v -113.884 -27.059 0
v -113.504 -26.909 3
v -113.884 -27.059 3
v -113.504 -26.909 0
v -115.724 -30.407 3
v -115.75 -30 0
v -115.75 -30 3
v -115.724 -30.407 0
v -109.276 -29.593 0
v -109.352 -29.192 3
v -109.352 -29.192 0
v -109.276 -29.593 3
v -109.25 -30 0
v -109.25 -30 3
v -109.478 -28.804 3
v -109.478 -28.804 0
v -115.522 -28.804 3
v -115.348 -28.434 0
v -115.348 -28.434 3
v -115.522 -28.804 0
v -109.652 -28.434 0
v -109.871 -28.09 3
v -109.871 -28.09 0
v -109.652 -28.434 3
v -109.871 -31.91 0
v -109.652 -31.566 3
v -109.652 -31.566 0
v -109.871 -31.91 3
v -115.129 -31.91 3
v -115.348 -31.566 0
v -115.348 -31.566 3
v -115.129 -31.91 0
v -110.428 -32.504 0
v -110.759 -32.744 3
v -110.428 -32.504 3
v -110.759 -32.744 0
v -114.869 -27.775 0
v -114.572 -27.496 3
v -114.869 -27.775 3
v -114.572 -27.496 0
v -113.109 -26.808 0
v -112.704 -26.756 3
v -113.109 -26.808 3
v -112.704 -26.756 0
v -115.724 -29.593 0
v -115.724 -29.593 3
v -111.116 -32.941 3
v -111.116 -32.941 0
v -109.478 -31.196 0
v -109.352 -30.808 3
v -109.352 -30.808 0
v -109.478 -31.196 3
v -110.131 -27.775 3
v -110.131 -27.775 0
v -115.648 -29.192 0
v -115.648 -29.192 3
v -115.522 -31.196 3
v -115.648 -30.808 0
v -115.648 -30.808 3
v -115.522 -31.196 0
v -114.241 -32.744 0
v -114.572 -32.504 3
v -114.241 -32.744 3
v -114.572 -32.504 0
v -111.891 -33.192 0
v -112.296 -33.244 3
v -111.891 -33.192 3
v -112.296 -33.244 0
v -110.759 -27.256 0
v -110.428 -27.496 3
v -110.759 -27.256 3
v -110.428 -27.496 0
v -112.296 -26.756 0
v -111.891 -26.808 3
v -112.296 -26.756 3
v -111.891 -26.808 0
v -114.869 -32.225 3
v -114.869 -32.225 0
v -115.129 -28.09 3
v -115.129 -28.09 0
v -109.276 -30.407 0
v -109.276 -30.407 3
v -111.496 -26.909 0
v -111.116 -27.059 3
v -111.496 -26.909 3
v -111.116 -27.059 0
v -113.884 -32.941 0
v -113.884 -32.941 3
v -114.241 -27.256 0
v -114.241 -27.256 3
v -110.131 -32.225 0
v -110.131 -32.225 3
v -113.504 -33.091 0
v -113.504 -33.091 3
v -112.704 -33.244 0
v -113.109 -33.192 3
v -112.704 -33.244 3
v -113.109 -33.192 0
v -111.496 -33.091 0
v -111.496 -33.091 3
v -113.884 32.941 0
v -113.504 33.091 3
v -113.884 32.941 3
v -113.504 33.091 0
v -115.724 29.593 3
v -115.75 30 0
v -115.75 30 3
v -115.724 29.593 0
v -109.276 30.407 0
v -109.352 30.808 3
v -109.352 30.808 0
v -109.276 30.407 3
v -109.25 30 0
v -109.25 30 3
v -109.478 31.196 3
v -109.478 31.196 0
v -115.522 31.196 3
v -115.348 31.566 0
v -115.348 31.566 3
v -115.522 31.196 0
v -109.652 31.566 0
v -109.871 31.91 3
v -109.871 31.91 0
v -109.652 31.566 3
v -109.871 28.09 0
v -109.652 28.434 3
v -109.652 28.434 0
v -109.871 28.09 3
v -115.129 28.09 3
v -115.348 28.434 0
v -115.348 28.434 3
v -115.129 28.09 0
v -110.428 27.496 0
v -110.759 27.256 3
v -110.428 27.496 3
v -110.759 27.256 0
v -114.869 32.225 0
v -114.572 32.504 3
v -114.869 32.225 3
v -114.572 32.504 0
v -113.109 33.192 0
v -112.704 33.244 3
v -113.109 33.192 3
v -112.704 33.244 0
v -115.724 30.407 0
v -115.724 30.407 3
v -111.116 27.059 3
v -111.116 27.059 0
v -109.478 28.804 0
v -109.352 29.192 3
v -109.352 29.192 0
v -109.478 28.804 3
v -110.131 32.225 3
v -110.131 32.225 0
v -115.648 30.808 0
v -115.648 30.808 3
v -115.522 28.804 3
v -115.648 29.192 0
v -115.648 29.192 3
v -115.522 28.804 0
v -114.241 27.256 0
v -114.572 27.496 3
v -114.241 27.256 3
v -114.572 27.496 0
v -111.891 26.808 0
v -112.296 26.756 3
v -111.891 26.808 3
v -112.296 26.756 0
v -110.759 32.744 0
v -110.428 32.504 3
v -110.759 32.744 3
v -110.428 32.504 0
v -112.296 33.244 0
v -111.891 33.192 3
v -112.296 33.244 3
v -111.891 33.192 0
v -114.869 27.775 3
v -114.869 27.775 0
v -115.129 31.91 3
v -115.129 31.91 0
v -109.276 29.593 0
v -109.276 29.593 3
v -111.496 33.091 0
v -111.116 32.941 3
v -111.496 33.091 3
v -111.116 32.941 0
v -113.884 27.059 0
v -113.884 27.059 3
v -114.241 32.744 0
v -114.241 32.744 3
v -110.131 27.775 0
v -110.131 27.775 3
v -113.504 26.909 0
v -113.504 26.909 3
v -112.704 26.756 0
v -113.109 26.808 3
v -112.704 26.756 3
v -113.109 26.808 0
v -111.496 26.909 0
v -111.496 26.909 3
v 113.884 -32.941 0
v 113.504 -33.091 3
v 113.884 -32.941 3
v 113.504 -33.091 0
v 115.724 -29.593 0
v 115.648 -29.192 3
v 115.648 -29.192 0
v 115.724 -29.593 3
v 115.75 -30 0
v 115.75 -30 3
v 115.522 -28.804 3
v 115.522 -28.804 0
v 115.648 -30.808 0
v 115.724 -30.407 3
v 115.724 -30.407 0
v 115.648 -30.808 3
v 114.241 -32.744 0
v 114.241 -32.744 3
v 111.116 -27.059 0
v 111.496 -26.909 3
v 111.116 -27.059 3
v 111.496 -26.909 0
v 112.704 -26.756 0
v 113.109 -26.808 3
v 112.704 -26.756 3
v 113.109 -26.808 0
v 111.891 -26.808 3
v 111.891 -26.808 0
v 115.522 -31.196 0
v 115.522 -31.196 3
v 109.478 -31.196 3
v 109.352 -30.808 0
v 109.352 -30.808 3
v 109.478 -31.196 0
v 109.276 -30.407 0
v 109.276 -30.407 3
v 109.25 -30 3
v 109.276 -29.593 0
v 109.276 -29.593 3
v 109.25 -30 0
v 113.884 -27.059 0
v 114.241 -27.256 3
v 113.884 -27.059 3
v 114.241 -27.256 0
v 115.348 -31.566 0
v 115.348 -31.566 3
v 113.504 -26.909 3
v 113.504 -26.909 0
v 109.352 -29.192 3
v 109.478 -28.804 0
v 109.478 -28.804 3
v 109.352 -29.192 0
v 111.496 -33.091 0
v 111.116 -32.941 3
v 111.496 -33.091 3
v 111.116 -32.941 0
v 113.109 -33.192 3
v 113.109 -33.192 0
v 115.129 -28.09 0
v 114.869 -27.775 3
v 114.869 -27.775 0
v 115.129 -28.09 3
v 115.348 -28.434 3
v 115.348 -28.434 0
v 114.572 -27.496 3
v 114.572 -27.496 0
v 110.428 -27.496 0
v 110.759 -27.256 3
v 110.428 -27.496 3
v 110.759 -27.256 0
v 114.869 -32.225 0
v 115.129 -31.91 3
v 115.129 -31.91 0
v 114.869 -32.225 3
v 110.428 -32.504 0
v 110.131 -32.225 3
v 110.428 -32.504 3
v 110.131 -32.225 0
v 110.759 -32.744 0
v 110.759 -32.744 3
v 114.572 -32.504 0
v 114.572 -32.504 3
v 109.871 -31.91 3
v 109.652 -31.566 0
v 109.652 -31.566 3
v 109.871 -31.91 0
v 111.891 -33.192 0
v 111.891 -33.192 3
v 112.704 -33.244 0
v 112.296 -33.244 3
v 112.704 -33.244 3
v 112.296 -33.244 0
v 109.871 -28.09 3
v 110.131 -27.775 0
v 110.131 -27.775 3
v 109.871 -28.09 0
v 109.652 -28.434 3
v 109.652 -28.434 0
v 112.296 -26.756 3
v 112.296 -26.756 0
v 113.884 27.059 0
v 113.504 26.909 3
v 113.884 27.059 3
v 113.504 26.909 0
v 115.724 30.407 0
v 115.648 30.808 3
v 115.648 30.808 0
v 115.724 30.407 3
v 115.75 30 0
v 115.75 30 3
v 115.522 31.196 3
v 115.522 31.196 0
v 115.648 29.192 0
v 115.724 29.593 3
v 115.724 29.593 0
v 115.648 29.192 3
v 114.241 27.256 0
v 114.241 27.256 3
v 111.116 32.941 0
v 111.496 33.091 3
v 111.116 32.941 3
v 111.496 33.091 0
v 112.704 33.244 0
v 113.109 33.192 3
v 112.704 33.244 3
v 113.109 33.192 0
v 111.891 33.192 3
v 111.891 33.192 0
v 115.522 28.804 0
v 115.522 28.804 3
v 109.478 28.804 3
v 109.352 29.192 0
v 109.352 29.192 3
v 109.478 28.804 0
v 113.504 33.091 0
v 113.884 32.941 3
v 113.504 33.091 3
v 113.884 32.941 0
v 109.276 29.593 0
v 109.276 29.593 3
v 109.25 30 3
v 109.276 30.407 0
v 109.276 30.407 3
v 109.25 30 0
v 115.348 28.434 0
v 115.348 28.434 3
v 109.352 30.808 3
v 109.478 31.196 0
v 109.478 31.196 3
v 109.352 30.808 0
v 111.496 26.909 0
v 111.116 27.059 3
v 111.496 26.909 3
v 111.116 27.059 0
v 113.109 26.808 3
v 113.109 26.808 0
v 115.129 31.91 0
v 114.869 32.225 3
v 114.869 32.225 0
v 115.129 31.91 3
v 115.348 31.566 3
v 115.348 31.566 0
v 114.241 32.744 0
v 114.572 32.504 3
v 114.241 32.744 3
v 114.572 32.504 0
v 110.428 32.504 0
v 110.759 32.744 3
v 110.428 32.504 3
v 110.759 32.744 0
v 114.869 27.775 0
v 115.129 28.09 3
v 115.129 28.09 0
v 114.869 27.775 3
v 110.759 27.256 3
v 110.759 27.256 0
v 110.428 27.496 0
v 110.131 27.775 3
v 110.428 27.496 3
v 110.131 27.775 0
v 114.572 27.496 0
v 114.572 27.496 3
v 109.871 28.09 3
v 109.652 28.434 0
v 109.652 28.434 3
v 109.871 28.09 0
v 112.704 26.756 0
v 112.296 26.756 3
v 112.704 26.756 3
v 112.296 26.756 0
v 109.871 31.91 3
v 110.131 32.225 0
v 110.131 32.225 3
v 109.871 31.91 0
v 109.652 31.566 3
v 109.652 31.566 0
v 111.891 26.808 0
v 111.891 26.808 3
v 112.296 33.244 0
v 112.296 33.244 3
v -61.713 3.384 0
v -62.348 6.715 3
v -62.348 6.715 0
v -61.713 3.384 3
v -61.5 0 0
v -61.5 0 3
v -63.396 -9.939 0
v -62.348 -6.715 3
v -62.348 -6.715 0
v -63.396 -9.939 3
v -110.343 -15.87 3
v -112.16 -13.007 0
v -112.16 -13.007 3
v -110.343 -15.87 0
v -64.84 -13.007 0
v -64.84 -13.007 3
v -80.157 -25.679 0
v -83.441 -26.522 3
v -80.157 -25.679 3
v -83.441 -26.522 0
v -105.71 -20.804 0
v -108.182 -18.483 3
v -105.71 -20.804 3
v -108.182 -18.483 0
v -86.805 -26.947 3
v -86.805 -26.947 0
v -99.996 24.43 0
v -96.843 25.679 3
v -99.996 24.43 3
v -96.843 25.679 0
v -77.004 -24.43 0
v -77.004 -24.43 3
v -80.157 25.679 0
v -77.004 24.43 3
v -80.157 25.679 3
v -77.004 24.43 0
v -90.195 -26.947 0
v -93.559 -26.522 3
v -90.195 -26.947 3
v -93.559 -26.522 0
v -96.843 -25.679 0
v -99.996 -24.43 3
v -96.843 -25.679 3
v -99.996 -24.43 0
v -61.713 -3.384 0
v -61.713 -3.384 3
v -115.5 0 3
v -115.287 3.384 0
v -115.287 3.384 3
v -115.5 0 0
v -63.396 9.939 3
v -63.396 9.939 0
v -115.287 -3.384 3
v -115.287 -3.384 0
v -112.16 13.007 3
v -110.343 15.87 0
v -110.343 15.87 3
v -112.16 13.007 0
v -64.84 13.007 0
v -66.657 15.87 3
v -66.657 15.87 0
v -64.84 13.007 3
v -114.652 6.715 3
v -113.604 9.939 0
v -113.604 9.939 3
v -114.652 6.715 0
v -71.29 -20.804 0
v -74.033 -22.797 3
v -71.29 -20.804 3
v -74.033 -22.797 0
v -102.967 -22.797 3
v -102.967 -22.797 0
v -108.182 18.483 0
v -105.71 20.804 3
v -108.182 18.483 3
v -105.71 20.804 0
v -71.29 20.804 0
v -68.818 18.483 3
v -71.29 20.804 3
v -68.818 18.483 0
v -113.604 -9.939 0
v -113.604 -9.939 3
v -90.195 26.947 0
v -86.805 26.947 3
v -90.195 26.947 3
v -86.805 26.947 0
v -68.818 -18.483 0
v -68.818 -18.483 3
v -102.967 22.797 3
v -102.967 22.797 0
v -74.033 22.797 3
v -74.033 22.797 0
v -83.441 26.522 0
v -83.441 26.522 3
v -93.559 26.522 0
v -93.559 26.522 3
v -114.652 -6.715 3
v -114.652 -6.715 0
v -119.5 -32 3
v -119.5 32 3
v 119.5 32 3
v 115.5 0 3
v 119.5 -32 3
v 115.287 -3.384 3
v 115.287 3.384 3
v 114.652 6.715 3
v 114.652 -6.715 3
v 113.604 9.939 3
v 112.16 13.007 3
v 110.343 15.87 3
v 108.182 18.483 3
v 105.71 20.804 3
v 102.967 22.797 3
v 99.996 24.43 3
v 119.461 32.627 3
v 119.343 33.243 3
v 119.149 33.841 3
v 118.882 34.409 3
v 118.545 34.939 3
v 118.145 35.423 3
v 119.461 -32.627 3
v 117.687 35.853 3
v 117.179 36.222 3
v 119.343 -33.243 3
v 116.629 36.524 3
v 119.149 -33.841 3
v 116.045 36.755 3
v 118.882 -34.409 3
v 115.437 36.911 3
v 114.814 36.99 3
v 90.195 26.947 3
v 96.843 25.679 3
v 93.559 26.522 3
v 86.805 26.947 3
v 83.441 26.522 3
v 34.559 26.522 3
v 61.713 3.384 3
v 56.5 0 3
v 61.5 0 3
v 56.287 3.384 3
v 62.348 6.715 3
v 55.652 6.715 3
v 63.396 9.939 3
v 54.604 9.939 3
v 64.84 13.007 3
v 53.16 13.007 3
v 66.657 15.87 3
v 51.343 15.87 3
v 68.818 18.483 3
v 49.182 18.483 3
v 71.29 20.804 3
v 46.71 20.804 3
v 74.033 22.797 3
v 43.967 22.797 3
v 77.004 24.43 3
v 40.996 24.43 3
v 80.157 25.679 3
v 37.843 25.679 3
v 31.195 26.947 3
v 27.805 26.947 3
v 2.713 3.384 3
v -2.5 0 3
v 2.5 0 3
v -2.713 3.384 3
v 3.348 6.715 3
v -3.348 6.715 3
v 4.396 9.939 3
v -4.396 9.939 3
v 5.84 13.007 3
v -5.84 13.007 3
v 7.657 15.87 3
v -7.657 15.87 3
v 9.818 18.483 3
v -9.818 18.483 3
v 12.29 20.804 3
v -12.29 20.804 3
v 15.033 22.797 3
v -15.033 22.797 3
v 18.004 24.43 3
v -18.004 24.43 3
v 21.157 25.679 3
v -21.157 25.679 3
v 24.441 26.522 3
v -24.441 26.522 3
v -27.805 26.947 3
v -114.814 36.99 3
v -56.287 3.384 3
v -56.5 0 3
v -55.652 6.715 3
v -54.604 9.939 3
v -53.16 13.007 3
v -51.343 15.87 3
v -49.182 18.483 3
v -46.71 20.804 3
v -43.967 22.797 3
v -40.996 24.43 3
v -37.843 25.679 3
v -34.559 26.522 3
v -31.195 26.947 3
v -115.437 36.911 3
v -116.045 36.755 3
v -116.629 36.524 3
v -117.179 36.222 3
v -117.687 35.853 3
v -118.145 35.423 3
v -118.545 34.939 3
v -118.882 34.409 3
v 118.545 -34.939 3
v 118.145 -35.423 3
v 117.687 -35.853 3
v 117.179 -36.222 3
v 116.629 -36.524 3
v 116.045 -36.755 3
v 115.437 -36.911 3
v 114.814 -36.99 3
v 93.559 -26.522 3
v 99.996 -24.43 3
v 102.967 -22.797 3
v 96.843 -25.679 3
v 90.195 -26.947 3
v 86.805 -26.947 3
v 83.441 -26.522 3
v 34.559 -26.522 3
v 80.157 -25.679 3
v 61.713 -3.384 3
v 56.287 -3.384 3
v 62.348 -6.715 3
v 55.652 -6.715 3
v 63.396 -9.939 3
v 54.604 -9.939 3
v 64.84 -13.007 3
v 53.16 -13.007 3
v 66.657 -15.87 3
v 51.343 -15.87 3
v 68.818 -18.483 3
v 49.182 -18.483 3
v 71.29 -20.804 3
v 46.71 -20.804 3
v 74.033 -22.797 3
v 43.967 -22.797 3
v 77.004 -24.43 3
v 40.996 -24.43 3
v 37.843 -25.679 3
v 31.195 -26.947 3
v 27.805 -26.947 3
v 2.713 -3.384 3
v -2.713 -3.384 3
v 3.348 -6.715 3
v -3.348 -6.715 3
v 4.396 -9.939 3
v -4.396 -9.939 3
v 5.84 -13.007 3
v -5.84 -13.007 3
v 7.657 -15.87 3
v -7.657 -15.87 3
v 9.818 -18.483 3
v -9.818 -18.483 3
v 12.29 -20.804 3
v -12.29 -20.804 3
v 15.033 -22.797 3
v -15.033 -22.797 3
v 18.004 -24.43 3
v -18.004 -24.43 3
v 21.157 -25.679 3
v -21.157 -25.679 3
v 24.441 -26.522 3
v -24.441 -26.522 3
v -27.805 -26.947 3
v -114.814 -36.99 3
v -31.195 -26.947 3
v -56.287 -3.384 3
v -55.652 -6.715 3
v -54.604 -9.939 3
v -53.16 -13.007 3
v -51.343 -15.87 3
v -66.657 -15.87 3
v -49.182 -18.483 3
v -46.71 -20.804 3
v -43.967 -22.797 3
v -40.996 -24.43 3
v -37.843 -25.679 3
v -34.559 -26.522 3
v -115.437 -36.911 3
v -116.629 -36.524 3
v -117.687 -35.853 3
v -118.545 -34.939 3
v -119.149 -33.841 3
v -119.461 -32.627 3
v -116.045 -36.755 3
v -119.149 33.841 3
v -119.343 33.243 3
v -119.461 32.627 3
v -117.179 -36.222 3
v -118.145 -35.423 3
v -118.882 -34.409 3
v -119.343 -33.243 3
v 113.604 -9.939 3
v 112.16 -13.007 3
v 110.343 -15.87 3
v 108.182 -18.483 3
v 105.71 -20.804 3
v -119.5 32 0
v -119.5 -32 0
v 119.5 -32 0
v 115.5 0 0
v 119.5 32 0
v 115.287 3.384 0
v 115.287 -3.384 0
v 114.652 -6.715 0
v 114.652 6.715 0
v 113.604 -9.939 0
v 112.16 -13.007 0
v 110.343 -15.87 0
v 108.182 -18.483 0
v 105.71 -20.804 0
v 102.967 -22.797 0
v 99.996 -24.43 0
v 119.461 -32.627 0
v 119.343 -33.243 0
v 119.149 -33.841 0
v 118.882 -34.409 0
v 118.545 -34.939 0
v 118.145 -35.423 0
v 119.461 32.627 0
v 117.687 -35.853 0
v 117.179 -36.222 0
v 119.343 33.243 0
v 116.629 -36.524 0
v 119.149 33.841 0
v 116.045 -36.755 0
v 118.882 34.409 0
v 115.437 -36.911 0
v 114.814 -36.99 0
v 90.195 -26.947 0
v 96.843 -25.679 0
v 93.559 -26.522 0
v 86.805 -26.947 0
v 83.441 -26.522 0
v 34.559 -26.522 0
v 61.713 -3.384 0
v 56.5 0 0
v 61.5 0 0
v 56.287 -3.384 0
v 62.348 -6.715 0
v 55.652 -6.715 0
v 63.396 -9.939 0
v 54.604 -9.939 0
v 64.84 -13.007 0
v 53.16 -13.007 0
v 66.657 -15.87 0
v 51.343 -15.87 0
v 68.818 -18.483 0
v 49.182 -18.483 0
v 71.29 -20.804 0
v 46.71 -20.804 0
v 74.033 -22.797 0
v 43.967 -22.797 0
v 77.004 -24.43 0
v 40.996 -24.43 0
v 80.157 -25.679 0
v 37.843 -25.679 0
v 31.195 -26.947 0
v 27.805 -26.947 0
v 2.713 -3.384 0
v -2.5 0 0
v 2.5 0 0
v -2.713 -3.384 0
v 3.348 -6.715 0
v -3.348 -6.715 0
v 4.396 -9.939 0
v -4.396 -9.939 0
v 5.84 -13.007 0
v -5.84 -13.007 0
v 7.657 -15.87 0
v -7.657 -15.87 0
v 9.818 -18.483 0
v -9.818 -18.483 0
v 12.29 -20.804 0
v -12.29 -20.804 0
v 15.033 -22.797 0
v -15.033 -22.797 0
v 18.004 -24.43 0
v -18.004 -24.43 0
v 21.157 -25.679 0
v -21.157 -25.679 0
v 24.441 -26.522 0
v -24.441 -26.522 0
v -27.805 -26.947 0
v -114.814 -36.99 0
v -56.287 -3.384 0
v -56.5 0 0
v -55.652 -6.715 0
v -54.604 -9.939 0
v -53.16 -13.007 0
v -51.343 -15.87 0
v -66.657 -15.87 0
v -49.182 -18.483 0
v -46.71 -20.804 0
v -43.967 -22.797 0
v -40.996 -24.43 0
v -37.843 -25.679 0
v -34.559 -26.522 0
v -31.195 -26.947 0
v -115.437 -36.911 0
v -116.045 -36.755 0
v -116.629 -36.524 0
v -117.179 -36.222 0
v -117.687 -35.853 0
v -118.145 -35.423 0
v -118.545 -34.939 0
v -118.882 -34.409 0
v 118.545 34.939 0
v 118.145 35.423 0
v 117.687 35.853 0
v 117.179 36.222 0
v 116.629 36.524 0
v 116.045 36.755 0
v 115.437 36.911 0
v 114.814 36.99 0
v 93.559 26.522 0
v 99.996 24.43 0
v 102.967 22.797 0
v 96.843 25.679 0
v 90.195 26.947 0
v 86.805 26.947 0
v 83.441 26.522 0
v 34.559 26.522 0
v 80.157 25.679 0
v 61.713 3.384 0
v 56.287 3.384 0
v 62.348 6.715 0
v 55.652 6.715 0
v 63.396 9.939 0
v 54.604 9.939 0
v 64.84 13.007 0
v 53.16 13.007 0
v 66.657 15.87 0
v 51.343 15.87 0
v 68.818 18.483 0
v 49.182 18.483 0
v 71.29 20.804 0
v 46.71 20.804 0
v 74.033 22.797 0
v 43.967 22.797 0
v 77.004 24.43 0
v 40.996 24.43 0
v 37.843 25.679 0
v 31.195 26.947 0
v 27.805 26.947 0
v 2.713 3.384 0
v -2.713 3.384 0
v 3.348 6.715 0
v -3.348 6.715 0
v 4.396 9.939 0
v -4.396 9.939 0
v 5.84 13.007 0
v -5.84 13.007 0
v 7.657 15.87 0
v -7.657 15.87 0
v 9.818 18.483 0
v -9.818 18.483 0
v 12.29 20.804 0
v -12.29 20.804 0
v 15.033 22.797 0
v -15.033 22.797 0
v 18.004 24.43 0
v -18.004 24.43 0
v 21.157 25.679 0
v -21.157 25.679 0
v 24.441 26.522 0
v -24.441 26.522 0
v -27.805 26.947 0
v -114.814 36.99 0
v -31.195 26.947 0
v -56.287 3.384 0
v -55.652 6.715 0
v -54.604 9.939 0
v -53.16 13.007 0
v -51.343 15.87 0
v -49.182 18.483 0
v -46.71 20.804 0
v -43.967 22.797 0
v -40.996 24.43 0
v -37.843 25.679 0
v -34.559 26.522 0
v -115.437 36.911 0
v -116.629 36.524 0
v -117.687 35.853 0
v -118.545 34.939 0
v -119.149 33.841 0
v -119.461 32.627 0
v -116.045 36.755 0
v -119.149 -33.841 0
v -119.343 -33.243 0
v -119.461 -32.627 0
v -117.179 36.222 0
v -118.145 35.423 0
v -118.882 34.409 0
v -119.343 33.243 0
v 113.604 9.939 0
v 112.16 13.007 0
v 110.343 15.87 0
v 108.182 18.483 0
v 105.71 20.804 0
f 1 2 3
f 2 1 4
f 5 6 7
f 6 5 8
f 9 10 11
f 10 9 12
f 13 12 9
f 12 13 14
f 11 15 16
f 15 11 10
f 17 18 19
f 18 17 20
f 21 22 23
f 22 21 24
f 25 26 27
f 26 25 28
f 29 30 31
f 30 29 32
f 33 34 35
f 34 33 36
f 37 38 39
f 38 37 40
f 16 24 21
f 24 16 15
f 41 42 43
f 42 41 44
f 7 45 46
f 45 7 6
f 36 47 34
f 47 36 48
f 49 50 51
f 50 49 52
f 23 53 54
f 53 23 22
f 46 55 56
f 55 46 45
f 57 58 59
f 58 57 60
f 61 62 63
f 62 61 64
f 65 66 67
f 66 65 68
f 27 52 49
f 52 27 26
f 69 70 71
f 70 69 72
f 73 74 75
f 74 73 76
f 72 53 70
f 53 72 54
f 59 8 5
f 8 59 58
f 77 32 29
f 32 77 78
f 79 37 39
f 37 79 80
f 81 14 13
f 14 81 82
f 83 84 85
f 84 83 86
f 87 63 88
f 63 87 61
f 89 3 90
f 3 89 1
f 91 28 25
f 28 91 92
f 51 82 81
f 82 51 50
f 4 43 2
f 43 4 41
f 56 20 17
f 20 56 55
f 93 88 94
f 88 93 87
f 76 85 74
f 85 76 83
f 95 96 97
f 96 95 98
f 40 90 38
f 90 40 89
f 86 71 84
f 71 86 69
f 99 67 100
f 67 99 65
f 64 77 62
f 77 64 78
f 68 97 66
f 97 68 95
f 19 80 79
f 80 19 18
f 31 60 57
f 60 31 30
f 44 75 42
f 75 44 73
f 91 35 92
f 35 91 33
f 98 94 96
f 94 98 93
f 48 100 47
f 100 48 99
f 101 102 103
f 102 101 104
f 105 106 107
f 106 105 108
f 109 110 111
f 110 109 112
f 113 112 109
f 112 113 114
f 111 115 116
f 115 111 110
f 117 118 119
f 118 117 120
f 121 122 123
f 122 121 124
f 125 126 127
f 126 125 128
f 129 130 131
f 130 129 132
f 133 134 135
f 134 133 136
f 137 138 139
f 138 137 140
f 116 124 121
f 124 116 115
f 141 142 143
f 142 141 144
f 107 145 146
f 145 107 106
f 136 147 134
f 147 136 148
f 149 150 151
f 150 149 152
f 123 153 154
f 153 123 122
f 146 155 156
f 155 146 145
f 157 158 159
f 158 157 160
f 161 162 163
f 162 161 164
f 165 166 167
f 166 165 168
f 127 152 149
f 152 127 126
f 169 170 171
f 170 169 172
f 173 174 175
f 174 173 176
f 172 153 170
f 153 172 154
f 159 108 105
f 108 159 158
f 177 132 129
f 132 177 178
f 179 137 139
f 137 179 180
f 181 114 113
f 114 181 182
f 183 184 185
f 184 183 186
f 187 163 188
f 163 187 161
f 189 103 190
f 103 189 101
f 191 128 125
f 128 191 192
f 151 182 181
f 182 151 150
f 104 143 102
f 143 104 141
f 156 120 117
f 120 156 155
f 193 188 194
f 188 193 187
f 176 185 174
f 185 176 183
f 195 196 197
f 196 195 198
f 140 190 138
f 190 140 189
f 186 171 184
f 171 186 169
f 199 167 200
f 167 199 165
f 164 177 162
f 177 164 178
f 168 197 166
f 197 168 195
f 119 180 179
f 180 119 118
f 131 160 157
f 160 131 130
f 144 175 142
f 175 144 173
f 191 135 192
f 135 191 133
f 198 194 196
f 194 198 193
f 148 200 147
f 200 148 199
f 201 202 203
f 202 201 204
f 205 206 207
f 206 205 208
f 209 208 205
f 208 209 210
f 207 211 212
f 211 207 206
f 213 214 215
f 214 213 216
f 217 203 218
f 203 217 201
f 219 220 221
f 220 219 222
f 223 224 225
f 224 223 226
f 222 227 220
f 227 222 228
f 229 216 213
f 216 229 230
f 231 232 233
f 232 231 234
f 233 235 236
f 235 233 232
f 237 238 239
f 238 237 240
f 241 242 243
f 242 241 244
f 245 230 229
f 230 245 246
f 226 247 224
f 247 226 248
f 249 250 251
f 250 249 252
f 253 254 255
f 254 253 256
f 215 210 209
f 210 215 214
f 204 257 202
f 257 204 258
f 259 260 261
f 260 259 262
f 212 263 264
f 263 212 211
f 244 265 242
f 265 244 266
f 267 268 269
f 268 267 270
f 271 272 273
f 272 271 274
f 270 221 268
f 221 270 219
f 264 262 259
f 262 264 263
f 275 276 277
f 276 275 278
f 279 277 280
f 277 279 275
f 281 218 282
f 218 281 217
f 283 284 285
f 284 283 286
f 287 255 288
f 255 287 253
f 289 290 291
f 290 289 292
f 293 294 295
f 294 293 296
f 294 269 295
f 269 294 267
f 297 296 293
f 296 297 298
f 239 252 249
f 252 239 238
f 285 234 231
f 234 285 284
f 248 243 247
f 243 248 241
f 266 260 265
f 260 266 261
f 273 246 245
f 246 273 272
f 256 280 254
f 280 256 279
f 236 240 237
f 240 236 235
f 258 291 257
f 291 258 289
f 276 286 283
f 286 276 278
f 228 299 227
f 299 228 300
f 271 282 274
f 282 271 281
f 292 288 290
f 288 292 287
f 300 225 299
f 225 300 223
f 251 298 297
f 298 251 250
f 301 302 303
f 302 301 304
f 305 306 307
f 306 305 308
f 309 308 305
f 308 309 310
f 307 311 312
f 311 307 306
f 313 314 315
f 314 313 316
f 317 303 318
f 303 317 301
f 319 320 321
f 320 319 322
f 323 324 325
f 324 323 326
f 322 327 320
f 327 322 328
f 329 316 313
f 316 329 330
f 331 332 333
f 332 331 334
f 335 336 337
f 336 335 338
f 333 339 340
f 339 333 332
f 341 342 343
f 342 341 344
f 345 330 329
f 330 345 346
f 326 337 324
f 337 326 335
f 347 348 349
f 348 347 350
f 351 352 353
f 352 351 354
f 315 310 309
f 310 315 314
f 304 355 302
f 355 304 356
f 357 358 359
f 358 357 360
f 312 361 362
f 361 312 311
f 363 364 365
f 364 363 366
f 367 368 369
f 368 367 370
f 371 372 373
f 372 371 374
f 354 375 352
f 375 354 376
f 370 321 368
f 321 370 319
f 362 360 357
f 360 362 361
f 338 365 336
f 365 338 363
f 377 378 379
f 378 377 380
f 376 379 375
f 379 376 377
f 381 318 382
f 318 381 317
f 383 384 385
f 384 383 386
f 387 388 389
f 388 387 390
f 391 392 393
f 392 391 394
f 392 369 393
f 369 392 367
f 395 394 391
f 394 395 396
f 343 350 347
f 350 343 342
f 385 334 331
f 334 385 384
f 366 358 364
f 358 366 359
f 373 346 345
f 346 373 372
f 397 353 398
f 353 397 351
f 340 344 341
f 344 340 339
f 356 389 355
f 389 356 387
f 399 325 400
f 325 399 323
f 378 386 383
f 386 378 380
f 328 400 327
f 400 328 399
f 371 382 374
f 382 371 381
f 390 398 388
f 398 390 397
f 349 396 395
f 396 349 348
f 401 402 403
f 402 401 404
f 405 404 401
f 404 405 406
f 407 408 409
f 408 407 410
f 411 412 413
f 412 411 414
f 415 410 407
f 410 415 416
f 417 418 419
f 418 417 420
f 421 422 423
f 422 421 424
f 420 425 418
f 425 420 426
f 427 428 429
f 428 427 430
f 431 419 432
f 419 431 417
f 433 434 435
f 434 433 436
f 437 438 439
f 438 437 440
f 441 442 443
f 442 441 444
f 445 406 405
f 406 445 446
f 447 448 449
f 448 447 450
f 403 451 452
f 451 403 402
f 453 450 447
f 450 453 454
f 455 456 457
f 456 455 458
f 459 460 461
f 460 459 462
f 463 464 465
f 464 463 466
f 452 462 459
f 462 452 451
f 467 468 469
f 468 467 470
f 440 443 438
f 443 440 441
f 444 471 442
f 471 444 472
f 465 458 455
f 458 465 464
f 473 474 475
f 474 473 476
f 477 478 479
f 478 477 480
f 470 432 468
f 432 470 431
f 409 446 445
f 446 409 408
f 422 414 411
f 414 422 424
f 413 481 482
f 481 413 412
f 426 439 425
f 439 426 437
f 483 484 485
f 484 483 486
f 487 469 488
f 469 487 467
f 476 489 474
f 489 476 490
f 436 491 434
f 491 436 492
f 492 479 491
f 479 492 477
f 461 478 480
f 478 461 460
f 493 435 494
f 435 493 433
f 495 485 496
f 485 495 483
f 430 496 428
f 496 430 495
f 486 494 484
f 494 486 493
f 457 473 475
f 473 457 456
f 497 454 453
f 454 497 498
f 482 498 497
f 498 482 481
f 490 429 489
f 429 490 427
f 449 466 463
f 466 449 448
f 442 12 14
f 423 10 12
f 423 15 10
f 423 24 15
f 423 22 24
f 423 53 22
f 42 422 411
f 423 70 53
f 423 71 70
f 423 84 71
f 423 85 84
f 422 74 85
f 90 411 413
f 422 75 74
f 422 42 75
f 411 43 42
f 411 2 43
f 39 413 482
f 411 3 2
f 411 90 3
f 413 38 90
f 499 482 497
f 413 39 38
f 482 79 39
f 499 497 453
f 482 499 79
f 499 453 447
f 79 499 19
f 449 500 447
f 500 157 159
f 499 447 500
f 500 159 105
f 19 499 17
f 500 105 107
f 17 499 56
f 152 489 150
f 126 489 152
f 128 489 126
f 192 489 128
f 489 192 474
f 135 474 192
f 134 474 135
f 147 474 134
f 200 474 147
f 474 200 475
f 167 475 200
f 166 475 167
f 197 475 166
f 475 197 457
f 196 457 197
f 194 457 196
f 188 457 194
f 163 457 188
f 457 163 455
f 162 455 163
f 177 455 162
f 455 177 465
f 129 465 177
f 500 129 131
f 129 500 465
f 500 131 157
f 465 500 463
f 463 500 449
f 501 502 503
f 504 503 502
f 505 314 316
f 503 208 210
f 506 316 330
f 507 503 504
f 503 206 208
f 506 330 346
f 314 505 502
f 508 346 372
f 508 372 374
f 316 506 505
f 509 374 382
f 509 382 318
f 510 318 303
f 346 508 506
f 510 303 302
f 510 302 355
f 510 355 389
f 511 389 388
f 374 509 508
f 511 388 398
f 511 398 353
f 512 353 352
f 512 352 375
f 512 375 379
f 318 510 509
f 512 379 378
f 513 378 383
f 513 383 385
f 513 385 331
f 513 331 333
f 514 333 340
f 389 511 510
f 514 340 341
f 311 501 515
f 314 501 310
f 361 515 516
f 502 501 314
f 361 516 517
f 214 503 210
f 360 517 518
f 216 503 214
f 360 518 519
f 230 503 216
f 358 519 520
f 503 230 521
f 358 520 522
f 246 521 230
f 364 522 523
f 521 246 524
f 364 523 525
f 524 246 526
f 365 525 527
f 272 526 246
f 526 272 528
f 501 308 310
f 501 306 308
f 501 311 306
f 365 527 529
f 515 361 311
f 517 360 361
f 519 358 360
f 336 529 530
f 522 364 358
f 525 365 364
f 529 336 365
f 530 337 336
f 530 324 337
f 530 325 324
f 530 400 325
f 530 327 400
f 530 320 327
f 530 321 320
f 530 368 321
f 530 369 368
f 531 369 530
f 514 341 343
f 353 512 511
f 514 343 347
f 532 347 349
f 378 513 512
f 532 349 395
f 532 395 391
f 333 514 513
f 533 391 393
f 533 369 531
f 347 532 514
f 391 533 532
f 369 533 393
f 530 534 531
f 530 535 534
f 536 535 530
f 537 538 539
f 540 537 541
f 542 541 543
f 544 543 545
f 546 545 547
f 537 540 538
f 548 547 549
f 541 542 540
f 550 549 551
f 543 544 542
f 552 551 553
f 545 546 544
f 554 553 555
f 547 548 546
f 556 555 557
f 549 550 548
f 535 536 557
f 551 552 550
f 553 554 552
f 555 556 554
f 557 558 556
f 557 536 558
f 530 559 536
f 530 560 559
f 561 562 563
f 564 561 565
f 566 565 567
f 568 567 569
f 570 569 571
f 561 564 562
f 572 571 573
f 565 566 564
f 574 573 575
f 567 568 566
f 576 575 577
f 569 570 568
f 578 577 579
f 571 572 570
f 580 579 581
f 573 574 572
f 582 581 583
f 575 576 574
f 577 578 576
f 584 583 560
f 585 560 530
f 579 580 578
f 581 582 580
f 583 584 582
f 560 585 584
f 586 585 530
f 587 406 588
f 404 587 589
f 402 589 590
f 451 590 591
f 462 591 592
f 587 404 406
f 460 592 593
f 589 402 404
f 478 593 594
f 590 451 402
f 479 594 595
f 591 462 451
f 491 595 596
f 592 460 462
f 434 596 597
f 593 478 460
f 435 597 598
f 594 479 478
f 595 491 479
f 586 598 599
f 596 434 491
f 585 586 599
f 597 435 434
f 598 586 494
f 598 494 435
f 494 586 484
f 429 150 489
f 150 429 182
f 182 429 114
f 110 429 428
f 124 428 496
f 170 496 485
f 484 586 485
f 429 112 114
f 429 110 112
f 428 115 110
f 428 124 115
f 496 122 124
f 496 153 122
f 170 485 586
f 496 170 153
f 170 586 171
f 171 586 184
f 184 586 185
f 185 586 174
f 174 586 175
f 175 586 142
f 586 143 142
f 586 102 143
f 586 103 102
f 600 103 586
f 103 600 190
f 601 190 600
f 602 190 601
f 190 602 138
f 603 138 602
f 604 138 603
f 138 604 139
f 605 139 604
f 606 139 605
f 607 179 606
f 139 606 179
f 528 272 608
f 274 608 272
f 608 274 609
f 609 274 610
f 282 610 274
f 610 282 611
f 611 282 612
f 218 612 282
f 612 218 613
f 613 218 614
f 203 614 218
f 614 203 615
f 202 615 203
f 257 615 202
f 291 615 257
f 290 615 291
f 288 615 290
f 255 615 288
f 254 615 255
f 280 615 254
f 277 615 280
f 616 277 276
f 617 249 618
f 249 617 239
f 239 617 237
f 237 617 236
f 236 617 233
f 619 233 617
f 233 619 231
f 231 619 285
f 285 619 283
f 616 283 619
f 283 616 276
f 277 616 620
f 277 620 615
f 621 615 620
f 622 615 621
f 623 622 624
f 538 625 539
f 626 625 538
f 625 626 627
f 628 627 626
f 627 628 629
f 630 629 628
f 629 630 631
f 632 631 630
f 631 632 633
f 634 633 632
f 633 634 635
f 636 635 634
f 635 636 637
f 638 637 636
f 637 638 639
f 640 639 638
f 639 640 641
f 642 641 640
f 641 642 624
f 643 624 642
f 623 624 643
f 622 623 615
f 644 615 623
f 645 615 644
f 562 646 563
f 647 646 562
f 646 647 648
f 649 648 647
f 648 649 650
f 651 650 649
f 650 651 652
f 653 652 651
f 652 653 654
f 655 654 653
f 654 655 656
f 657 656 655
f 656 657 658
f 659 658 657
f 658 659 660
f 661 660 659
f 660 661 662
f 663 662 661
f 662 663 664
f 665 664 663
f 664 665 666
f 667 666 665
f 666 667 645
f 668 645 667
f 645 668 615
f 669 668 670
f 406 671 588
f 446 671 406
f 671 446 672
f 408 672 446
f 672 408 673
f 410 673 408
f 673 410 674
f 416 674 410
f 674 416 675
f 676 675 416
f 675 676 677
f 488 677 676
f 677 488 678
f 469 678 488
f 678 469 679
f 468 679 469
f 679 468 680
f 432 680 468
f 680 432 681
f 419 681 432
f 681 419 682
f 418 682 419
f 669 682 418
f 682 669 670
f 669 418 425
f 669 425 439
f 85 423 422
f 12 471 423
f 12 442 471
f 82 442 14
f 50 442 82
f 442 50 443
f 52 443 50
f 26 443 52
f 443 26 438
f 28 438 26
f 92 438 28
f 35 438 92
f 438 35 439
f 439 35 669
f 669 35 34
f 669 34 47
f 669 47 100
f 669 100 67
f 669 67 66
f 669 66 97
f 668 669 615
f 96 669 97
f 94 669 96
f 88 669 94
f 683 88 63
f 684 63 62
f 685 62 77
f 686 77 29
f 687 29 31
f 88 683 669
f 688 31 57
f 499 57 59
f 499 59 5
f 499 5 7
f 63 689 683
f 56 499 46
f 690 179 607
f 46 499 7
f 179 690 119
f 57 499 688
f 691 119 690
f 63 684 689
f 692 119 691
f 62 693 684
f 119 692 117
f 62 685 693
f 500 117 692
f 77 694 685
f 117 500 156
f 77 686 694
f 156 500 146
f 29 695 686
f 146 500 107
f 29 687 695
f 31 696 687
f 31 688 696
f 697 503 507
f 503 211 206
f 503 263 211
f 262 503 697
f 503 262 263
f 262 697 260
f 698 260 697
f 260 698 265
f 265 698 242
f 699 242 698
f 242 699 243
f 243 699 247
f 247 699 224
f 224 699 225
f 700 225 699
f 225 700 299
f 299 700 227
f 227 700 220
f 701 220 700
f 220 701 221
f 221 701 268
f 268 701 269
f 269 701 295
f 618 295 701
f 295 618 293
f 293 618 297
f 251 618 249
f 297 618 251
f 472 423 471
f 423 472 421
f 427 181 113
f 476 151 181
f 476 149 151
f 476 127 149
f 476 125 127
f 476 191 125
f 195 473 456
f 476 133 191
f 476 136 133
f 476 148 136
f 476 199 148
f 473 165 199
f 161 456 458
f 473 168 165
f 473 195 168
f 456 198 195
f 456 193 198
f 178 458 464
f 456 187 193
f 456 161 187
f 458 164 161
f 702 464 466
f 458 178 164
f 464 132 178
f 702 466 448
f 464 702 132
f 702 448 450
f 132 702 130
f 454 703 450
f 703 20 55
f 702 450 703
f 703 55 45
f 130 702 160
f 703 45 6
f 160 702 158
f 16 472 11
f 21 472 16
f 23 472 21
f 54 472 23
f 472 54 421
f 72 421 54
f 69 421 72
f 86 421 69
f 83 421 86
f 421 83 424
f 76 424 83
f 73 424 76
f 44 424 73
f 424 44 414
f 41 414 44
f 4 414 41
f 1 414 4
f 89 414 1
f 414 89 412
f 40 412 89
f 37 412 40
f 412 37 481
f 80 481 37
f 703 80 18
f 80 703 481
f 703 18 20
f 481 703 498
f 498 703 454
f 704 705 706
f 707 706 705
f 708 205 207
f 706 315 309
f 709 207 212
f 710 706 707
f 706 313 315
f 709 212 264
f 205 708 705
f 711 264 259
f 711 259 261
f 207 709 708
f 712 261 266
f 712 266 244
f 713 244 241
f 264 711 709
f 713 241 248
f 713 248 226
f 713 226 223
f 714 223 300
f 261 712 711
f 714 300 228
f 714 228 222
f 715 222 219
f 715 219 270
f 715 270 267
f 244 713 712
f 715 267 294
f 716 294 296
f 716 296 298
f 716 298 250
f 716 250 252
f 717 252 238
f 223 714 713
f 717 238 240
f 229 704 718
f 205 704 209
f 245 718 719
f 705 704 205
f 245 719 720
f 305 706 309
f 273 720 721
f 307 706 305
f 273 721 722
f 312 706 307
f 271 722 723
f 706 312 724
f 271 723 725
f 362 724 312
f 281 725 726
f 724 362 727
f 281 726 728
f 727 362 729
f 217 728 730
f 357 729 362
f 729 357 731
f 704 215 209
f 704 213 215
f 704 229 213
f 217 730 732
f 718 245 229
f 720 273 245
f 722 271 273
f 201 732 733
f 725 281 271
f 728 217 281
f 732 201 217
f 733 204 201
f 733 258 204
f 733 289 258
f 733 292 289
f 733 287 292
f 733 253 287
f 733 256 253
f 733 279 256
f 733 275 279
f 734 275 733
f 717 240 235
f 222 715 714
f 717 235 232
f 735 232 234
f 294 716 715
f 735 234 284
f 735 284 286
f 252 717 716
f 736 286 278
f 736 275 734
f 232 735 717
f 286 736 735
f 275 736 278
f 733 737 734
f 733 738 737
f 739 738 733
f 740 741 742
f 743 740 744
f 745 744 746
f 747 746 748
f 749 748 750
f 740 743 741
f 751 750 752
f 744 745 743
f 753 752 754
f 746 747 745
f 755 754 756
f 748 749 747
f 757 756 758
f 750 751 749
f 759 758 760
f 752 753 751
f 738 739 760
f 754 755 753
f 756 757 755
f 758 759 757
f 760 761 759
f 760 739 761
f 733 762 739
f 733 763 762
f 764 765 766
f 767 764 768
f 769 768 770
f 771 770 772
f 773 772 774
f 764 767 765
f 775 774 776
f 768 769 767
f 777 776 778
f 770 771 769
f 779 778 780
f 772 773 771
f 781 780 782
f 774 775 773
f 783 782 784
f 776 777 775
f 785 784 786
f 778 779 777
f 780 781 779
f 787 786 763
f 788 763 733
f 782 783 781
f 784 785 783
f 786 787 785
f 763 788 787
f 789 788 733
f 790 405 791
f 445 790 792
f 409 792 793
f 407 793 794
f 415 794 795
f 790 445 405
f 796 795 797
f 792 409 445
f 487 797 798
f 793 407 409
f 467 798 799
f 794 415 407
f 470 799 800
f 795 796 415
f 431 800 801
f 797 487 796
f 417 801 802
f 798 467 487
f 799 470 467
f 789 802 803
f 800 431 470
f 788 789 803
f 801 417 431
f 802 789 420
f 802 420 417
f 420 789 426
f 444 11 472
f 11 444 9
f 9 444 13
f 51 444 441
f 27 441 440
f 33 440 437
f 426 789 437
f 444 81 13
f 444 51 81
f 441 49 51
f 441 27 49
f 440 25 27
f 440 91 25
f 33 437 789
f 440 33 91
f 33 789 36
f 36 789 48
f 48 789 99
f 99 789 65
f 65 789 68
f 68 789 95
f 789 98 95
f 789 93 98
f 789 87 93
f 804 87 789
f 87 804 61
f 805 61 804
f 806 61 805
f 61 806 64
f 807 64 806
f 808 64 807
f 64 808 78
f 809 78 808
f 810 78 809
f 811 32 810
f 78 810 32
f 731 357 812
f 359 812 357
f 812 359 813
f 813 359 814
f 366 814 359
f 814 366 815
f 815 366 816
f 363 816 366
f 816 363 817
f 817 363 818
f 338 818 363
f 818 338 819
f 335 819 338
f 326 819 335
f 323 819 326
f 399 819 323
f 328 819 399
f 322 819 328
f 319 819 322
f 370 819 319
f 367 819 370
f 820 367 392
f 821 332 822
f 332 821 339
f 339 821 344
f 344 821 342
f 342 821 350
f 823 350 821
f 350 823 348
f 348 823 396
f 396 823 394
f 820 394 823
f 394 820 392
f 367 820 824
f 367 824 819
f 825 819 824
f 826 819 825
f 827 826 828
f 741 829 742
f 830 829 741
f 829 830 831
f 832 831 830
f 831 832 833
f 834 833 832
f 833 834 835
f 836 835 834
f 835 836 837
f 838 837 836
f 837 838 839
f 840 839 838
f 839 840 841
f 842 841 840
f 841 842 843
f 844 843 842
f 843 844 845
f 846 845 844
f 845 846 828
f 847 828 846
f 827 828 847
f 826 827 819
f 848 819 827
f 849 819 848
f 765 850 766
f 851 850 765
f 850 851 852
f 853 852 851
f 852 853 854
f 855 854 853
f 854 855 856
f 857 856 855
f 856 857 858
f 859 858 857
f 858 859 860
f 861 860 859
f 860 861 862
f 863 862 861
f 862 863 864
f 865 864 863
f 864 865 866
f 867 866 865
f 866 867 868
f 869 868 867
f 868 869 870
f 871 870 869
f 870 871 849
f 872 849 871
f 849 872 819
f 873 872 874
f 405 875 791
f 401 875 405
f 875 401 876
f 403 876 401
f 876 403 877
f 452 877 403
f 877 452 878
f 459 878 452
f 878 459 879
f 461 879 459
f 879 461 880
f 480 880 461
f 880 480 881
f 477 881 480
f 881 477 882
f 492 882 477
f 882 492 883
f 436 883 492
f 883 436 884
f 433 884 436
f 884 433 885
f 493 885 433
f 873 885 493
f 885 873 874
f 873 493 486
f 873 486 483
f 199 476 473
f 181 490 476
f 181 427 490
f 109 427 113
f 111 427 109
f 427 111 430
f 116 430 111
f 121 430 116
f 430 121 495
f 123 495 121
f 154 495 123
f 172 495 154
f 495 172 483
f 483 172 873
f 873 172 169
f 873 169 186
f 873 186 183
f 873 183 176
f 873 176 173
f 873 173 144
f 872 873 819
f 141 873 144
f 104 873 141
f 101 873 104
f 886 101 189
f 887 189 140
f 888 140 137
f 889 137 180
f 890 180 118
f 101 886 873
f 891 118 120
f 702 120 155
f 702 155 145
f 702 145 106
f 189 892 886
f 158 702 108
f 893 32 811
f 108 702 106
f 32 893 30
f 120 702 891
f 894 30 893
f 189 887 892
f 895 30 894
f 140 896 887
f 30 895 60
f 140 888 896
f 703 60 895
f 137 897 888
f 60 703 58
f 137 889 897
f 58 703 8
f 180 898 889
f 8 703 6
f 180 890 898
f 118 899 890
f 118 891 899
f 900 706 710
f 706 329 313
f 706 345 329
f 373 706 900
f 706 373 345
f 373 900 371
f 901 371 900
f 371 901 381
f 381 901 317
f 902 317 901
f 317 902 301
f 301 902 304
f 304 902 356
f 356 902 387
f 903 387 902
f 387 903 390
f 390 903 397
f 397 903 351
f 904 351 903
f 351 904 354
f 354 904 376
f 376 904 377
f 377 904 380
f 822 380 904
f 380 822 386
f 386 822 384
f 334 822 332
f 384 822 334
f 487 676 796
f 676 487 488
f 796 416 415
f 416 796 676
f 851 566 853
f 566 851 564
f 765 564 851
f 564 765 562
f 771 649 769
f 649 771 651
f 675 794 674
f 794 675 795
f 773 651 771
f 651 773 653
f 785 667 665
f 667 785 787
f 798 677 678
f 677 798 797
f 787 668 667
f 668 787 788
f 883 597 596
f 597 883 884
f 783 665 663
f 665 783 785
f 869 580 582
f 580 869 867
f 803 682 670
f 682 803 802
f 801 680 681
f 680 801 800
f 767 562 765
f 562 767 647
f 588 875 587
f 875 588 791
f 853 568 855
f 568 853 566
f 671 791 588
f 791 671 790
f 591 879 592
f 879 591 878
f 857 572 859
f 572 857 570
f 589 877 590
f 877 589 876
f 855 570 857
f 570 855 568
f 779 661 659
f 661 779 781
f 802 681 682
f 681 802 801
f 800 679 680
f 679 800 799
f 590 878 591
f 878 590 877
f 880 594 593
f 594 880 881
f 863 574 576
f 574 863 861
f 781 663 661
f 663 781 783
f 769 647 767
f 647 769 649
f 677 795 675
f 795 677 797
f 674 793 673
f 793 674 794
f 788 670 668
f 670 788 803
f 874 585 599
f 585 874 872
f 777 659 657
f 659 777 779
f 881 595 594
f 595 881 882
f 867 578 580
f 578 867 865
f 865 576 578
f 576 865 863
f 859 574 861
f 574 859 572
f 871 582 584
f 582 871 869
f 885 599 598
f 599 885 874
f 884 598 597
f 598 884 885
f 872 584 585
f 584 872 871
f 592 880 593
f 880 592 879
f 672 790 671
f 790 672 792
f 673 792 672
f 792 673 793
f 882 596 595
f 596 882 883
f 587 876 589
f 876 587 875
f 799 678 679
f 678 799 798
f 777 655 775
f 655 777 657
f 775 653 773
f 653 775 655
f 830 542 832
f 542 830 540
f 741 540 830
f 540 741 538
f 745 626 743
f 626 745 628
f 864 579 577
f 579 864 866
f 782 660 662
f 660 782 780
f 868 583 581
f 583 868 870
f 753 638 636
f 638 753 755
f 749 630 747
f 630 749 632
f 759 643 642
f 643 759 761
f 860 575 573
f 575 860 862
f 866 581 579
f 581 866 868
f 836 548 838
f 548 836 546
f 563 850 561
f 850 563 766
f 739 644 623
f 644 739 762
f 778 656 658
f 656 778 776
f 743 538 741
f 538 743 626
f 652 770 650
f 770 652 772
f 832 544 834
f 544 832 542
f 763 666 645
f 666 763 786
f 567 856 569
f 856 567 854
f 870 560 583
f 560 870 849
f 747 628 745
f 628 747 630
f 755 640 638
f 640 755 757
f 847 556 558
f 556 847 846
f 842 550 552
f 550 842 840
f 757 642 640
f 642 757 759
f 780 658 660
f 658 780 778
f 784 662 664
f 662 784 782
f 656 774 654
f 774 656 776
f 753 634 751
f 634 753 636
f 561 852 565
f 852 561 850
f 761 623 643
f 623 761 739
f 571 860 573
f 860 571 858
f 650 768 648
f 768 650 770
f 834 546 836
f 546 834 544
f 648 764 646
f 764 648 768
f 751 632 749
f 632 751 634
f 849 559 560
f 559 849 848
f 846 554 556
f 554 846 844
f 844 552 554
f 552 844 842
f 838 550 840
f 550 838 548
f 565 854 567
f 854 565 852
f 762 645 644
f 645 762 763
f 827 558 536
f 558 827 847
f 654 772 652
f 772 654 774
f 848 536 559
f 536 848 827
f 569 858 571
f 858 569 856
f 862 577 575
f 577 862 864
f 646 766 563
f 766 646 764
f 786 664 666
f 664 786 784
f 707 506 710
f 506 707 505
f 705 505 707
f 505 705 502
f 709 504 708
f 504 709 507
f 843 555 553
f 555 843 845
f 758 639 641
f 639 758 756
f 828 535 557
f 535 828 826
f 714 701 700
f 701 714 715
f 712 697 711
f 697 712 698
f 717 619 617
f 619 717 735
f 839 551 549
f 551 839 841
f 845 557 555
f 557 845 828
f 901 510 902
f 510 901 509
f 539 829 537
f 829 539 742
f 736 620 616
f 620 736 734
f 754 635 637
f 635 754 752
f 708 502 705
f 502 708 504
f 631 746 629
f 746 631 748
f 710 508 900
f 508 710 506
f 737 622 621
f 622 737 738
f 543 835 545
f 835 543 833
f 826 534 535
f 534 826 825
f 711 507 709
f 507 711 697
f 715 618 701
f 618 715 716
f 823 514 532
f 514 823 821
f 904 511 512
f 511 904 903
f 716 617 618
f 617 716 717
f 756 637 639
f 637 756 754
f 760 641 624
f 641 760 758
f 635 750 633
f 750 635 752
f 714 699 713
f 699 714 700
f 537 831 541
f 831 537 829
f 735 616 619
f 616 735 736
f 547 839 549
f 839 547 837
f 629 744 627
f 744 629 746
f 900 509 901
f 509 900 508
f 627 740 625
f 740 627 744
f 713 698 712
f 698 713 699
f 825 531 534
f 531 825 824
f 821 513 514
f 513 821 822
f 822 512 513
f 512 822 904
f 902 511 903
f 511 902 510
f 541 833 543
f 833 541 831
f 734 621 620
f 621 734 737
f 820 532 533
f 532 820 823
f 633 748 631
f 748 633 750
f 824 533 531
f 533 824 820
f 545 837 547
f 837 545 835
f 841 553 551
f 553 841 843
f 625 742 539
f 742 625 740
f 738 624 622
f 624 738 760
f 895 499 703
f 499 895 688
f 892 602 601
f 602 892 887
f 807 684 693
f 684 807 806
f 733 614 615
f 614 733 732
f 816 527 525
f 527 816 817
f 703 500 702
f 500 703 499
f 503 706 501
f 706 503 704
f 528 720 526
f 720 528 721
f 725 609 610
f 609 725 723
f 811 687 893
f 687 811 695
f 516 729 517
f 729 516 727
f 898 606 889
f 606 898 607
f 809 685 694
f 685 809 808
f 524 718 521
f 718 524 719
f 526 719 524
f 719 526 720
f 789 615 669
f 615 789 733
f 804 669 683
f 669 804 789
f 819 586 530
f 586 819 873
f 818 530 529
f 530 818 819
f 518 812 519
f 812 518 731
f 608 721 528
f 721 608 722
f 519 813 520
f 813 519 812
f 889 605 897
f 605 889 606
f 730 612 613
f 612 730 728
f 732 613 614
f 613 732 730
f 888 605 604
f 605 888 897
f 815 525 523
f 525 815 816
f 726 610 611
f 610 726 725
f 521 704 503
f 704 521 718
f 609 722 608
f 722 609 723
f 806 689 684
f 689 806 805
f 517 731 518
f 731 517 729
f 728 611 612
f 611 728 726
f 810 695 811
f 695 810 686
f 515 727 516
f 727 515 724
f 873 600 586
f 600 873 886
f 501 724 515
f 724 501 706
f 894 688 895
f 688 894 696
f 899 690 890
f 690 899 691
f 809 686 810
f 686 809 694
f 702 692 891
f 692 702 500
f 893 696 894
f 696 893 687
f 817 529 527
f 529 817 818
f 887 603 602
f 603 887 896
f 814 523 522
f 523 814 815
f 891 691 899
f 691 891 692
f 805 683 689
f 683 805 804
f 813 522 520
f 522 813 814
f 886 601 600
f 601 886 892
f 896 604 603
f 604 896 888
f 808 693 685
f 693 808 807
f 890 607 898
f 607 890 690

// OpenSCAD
$fn = 50;

difference() {
	union() {
		hull() {
			translate(v = [-114.5, 32.0, 0]) {
				cylinder(h = 3, r = 5);
			}
			translate(v = [114.5, 32.0, 0]) {
				cylinder(h = 3, r = 5);
			}
			translate(v = [-114.5, -32.0, 0]) {
				cylinder(h = 3, r = 5);
			}
			translate(v = [114.5, -32.0, 0]) {
				cylinder(h = 3, r = 5);
			}
		}
	}
	union() {
		translate(v = [-112.5, -30.0, -100.0]) {
			cylinder(h = 200, r = 3.25);
		}
		translate(v = [-112.5, 30.0, -100.0]) {
			cylinder(h = 200, r = 3.25);
		}
		translate(v = [112.5, -30.0, -100.0]) {
			cylinder(h = 200, r = 3.25);
		}
		translate(v = [112.5, 30.0, -100.0]) {
			cylinder(h = 200, r = 3.25);
		}
		translate(v = [-112.5, -30.0, -100.0]) {
			cylinder(h = 200, r = 1.8);
		}
		translate(v = [-112.5, 30.0, -100.0]) {
			cylinder(h = 200, r = 1.8);
		}
		translate(v = [112.5, -30.0, -100.0]) {
			cylinder(h = 200, r = 1.8);
		}
		translate(v = [112.5, 30.0, -100.0]) {
			cylinder(h = 200, r = 1.8);
		}
		translate(v = [-88.5, 0, 0.0]) {
			cylinder(h = 3, r = 27.0);
		}
		translate(v = [-29.5, 0, 0.0]) {
			cylinder(h = 3, r = 27.0);
		}
		translate(v = [29.5, 0, 0.0]) {
			cylinder(h = 3, r = 27.0);
		}
		translate(v = [88.5, 0, 0.0]) {
			cylinder(h = 3, r = 27.0);
		}
	}
}
